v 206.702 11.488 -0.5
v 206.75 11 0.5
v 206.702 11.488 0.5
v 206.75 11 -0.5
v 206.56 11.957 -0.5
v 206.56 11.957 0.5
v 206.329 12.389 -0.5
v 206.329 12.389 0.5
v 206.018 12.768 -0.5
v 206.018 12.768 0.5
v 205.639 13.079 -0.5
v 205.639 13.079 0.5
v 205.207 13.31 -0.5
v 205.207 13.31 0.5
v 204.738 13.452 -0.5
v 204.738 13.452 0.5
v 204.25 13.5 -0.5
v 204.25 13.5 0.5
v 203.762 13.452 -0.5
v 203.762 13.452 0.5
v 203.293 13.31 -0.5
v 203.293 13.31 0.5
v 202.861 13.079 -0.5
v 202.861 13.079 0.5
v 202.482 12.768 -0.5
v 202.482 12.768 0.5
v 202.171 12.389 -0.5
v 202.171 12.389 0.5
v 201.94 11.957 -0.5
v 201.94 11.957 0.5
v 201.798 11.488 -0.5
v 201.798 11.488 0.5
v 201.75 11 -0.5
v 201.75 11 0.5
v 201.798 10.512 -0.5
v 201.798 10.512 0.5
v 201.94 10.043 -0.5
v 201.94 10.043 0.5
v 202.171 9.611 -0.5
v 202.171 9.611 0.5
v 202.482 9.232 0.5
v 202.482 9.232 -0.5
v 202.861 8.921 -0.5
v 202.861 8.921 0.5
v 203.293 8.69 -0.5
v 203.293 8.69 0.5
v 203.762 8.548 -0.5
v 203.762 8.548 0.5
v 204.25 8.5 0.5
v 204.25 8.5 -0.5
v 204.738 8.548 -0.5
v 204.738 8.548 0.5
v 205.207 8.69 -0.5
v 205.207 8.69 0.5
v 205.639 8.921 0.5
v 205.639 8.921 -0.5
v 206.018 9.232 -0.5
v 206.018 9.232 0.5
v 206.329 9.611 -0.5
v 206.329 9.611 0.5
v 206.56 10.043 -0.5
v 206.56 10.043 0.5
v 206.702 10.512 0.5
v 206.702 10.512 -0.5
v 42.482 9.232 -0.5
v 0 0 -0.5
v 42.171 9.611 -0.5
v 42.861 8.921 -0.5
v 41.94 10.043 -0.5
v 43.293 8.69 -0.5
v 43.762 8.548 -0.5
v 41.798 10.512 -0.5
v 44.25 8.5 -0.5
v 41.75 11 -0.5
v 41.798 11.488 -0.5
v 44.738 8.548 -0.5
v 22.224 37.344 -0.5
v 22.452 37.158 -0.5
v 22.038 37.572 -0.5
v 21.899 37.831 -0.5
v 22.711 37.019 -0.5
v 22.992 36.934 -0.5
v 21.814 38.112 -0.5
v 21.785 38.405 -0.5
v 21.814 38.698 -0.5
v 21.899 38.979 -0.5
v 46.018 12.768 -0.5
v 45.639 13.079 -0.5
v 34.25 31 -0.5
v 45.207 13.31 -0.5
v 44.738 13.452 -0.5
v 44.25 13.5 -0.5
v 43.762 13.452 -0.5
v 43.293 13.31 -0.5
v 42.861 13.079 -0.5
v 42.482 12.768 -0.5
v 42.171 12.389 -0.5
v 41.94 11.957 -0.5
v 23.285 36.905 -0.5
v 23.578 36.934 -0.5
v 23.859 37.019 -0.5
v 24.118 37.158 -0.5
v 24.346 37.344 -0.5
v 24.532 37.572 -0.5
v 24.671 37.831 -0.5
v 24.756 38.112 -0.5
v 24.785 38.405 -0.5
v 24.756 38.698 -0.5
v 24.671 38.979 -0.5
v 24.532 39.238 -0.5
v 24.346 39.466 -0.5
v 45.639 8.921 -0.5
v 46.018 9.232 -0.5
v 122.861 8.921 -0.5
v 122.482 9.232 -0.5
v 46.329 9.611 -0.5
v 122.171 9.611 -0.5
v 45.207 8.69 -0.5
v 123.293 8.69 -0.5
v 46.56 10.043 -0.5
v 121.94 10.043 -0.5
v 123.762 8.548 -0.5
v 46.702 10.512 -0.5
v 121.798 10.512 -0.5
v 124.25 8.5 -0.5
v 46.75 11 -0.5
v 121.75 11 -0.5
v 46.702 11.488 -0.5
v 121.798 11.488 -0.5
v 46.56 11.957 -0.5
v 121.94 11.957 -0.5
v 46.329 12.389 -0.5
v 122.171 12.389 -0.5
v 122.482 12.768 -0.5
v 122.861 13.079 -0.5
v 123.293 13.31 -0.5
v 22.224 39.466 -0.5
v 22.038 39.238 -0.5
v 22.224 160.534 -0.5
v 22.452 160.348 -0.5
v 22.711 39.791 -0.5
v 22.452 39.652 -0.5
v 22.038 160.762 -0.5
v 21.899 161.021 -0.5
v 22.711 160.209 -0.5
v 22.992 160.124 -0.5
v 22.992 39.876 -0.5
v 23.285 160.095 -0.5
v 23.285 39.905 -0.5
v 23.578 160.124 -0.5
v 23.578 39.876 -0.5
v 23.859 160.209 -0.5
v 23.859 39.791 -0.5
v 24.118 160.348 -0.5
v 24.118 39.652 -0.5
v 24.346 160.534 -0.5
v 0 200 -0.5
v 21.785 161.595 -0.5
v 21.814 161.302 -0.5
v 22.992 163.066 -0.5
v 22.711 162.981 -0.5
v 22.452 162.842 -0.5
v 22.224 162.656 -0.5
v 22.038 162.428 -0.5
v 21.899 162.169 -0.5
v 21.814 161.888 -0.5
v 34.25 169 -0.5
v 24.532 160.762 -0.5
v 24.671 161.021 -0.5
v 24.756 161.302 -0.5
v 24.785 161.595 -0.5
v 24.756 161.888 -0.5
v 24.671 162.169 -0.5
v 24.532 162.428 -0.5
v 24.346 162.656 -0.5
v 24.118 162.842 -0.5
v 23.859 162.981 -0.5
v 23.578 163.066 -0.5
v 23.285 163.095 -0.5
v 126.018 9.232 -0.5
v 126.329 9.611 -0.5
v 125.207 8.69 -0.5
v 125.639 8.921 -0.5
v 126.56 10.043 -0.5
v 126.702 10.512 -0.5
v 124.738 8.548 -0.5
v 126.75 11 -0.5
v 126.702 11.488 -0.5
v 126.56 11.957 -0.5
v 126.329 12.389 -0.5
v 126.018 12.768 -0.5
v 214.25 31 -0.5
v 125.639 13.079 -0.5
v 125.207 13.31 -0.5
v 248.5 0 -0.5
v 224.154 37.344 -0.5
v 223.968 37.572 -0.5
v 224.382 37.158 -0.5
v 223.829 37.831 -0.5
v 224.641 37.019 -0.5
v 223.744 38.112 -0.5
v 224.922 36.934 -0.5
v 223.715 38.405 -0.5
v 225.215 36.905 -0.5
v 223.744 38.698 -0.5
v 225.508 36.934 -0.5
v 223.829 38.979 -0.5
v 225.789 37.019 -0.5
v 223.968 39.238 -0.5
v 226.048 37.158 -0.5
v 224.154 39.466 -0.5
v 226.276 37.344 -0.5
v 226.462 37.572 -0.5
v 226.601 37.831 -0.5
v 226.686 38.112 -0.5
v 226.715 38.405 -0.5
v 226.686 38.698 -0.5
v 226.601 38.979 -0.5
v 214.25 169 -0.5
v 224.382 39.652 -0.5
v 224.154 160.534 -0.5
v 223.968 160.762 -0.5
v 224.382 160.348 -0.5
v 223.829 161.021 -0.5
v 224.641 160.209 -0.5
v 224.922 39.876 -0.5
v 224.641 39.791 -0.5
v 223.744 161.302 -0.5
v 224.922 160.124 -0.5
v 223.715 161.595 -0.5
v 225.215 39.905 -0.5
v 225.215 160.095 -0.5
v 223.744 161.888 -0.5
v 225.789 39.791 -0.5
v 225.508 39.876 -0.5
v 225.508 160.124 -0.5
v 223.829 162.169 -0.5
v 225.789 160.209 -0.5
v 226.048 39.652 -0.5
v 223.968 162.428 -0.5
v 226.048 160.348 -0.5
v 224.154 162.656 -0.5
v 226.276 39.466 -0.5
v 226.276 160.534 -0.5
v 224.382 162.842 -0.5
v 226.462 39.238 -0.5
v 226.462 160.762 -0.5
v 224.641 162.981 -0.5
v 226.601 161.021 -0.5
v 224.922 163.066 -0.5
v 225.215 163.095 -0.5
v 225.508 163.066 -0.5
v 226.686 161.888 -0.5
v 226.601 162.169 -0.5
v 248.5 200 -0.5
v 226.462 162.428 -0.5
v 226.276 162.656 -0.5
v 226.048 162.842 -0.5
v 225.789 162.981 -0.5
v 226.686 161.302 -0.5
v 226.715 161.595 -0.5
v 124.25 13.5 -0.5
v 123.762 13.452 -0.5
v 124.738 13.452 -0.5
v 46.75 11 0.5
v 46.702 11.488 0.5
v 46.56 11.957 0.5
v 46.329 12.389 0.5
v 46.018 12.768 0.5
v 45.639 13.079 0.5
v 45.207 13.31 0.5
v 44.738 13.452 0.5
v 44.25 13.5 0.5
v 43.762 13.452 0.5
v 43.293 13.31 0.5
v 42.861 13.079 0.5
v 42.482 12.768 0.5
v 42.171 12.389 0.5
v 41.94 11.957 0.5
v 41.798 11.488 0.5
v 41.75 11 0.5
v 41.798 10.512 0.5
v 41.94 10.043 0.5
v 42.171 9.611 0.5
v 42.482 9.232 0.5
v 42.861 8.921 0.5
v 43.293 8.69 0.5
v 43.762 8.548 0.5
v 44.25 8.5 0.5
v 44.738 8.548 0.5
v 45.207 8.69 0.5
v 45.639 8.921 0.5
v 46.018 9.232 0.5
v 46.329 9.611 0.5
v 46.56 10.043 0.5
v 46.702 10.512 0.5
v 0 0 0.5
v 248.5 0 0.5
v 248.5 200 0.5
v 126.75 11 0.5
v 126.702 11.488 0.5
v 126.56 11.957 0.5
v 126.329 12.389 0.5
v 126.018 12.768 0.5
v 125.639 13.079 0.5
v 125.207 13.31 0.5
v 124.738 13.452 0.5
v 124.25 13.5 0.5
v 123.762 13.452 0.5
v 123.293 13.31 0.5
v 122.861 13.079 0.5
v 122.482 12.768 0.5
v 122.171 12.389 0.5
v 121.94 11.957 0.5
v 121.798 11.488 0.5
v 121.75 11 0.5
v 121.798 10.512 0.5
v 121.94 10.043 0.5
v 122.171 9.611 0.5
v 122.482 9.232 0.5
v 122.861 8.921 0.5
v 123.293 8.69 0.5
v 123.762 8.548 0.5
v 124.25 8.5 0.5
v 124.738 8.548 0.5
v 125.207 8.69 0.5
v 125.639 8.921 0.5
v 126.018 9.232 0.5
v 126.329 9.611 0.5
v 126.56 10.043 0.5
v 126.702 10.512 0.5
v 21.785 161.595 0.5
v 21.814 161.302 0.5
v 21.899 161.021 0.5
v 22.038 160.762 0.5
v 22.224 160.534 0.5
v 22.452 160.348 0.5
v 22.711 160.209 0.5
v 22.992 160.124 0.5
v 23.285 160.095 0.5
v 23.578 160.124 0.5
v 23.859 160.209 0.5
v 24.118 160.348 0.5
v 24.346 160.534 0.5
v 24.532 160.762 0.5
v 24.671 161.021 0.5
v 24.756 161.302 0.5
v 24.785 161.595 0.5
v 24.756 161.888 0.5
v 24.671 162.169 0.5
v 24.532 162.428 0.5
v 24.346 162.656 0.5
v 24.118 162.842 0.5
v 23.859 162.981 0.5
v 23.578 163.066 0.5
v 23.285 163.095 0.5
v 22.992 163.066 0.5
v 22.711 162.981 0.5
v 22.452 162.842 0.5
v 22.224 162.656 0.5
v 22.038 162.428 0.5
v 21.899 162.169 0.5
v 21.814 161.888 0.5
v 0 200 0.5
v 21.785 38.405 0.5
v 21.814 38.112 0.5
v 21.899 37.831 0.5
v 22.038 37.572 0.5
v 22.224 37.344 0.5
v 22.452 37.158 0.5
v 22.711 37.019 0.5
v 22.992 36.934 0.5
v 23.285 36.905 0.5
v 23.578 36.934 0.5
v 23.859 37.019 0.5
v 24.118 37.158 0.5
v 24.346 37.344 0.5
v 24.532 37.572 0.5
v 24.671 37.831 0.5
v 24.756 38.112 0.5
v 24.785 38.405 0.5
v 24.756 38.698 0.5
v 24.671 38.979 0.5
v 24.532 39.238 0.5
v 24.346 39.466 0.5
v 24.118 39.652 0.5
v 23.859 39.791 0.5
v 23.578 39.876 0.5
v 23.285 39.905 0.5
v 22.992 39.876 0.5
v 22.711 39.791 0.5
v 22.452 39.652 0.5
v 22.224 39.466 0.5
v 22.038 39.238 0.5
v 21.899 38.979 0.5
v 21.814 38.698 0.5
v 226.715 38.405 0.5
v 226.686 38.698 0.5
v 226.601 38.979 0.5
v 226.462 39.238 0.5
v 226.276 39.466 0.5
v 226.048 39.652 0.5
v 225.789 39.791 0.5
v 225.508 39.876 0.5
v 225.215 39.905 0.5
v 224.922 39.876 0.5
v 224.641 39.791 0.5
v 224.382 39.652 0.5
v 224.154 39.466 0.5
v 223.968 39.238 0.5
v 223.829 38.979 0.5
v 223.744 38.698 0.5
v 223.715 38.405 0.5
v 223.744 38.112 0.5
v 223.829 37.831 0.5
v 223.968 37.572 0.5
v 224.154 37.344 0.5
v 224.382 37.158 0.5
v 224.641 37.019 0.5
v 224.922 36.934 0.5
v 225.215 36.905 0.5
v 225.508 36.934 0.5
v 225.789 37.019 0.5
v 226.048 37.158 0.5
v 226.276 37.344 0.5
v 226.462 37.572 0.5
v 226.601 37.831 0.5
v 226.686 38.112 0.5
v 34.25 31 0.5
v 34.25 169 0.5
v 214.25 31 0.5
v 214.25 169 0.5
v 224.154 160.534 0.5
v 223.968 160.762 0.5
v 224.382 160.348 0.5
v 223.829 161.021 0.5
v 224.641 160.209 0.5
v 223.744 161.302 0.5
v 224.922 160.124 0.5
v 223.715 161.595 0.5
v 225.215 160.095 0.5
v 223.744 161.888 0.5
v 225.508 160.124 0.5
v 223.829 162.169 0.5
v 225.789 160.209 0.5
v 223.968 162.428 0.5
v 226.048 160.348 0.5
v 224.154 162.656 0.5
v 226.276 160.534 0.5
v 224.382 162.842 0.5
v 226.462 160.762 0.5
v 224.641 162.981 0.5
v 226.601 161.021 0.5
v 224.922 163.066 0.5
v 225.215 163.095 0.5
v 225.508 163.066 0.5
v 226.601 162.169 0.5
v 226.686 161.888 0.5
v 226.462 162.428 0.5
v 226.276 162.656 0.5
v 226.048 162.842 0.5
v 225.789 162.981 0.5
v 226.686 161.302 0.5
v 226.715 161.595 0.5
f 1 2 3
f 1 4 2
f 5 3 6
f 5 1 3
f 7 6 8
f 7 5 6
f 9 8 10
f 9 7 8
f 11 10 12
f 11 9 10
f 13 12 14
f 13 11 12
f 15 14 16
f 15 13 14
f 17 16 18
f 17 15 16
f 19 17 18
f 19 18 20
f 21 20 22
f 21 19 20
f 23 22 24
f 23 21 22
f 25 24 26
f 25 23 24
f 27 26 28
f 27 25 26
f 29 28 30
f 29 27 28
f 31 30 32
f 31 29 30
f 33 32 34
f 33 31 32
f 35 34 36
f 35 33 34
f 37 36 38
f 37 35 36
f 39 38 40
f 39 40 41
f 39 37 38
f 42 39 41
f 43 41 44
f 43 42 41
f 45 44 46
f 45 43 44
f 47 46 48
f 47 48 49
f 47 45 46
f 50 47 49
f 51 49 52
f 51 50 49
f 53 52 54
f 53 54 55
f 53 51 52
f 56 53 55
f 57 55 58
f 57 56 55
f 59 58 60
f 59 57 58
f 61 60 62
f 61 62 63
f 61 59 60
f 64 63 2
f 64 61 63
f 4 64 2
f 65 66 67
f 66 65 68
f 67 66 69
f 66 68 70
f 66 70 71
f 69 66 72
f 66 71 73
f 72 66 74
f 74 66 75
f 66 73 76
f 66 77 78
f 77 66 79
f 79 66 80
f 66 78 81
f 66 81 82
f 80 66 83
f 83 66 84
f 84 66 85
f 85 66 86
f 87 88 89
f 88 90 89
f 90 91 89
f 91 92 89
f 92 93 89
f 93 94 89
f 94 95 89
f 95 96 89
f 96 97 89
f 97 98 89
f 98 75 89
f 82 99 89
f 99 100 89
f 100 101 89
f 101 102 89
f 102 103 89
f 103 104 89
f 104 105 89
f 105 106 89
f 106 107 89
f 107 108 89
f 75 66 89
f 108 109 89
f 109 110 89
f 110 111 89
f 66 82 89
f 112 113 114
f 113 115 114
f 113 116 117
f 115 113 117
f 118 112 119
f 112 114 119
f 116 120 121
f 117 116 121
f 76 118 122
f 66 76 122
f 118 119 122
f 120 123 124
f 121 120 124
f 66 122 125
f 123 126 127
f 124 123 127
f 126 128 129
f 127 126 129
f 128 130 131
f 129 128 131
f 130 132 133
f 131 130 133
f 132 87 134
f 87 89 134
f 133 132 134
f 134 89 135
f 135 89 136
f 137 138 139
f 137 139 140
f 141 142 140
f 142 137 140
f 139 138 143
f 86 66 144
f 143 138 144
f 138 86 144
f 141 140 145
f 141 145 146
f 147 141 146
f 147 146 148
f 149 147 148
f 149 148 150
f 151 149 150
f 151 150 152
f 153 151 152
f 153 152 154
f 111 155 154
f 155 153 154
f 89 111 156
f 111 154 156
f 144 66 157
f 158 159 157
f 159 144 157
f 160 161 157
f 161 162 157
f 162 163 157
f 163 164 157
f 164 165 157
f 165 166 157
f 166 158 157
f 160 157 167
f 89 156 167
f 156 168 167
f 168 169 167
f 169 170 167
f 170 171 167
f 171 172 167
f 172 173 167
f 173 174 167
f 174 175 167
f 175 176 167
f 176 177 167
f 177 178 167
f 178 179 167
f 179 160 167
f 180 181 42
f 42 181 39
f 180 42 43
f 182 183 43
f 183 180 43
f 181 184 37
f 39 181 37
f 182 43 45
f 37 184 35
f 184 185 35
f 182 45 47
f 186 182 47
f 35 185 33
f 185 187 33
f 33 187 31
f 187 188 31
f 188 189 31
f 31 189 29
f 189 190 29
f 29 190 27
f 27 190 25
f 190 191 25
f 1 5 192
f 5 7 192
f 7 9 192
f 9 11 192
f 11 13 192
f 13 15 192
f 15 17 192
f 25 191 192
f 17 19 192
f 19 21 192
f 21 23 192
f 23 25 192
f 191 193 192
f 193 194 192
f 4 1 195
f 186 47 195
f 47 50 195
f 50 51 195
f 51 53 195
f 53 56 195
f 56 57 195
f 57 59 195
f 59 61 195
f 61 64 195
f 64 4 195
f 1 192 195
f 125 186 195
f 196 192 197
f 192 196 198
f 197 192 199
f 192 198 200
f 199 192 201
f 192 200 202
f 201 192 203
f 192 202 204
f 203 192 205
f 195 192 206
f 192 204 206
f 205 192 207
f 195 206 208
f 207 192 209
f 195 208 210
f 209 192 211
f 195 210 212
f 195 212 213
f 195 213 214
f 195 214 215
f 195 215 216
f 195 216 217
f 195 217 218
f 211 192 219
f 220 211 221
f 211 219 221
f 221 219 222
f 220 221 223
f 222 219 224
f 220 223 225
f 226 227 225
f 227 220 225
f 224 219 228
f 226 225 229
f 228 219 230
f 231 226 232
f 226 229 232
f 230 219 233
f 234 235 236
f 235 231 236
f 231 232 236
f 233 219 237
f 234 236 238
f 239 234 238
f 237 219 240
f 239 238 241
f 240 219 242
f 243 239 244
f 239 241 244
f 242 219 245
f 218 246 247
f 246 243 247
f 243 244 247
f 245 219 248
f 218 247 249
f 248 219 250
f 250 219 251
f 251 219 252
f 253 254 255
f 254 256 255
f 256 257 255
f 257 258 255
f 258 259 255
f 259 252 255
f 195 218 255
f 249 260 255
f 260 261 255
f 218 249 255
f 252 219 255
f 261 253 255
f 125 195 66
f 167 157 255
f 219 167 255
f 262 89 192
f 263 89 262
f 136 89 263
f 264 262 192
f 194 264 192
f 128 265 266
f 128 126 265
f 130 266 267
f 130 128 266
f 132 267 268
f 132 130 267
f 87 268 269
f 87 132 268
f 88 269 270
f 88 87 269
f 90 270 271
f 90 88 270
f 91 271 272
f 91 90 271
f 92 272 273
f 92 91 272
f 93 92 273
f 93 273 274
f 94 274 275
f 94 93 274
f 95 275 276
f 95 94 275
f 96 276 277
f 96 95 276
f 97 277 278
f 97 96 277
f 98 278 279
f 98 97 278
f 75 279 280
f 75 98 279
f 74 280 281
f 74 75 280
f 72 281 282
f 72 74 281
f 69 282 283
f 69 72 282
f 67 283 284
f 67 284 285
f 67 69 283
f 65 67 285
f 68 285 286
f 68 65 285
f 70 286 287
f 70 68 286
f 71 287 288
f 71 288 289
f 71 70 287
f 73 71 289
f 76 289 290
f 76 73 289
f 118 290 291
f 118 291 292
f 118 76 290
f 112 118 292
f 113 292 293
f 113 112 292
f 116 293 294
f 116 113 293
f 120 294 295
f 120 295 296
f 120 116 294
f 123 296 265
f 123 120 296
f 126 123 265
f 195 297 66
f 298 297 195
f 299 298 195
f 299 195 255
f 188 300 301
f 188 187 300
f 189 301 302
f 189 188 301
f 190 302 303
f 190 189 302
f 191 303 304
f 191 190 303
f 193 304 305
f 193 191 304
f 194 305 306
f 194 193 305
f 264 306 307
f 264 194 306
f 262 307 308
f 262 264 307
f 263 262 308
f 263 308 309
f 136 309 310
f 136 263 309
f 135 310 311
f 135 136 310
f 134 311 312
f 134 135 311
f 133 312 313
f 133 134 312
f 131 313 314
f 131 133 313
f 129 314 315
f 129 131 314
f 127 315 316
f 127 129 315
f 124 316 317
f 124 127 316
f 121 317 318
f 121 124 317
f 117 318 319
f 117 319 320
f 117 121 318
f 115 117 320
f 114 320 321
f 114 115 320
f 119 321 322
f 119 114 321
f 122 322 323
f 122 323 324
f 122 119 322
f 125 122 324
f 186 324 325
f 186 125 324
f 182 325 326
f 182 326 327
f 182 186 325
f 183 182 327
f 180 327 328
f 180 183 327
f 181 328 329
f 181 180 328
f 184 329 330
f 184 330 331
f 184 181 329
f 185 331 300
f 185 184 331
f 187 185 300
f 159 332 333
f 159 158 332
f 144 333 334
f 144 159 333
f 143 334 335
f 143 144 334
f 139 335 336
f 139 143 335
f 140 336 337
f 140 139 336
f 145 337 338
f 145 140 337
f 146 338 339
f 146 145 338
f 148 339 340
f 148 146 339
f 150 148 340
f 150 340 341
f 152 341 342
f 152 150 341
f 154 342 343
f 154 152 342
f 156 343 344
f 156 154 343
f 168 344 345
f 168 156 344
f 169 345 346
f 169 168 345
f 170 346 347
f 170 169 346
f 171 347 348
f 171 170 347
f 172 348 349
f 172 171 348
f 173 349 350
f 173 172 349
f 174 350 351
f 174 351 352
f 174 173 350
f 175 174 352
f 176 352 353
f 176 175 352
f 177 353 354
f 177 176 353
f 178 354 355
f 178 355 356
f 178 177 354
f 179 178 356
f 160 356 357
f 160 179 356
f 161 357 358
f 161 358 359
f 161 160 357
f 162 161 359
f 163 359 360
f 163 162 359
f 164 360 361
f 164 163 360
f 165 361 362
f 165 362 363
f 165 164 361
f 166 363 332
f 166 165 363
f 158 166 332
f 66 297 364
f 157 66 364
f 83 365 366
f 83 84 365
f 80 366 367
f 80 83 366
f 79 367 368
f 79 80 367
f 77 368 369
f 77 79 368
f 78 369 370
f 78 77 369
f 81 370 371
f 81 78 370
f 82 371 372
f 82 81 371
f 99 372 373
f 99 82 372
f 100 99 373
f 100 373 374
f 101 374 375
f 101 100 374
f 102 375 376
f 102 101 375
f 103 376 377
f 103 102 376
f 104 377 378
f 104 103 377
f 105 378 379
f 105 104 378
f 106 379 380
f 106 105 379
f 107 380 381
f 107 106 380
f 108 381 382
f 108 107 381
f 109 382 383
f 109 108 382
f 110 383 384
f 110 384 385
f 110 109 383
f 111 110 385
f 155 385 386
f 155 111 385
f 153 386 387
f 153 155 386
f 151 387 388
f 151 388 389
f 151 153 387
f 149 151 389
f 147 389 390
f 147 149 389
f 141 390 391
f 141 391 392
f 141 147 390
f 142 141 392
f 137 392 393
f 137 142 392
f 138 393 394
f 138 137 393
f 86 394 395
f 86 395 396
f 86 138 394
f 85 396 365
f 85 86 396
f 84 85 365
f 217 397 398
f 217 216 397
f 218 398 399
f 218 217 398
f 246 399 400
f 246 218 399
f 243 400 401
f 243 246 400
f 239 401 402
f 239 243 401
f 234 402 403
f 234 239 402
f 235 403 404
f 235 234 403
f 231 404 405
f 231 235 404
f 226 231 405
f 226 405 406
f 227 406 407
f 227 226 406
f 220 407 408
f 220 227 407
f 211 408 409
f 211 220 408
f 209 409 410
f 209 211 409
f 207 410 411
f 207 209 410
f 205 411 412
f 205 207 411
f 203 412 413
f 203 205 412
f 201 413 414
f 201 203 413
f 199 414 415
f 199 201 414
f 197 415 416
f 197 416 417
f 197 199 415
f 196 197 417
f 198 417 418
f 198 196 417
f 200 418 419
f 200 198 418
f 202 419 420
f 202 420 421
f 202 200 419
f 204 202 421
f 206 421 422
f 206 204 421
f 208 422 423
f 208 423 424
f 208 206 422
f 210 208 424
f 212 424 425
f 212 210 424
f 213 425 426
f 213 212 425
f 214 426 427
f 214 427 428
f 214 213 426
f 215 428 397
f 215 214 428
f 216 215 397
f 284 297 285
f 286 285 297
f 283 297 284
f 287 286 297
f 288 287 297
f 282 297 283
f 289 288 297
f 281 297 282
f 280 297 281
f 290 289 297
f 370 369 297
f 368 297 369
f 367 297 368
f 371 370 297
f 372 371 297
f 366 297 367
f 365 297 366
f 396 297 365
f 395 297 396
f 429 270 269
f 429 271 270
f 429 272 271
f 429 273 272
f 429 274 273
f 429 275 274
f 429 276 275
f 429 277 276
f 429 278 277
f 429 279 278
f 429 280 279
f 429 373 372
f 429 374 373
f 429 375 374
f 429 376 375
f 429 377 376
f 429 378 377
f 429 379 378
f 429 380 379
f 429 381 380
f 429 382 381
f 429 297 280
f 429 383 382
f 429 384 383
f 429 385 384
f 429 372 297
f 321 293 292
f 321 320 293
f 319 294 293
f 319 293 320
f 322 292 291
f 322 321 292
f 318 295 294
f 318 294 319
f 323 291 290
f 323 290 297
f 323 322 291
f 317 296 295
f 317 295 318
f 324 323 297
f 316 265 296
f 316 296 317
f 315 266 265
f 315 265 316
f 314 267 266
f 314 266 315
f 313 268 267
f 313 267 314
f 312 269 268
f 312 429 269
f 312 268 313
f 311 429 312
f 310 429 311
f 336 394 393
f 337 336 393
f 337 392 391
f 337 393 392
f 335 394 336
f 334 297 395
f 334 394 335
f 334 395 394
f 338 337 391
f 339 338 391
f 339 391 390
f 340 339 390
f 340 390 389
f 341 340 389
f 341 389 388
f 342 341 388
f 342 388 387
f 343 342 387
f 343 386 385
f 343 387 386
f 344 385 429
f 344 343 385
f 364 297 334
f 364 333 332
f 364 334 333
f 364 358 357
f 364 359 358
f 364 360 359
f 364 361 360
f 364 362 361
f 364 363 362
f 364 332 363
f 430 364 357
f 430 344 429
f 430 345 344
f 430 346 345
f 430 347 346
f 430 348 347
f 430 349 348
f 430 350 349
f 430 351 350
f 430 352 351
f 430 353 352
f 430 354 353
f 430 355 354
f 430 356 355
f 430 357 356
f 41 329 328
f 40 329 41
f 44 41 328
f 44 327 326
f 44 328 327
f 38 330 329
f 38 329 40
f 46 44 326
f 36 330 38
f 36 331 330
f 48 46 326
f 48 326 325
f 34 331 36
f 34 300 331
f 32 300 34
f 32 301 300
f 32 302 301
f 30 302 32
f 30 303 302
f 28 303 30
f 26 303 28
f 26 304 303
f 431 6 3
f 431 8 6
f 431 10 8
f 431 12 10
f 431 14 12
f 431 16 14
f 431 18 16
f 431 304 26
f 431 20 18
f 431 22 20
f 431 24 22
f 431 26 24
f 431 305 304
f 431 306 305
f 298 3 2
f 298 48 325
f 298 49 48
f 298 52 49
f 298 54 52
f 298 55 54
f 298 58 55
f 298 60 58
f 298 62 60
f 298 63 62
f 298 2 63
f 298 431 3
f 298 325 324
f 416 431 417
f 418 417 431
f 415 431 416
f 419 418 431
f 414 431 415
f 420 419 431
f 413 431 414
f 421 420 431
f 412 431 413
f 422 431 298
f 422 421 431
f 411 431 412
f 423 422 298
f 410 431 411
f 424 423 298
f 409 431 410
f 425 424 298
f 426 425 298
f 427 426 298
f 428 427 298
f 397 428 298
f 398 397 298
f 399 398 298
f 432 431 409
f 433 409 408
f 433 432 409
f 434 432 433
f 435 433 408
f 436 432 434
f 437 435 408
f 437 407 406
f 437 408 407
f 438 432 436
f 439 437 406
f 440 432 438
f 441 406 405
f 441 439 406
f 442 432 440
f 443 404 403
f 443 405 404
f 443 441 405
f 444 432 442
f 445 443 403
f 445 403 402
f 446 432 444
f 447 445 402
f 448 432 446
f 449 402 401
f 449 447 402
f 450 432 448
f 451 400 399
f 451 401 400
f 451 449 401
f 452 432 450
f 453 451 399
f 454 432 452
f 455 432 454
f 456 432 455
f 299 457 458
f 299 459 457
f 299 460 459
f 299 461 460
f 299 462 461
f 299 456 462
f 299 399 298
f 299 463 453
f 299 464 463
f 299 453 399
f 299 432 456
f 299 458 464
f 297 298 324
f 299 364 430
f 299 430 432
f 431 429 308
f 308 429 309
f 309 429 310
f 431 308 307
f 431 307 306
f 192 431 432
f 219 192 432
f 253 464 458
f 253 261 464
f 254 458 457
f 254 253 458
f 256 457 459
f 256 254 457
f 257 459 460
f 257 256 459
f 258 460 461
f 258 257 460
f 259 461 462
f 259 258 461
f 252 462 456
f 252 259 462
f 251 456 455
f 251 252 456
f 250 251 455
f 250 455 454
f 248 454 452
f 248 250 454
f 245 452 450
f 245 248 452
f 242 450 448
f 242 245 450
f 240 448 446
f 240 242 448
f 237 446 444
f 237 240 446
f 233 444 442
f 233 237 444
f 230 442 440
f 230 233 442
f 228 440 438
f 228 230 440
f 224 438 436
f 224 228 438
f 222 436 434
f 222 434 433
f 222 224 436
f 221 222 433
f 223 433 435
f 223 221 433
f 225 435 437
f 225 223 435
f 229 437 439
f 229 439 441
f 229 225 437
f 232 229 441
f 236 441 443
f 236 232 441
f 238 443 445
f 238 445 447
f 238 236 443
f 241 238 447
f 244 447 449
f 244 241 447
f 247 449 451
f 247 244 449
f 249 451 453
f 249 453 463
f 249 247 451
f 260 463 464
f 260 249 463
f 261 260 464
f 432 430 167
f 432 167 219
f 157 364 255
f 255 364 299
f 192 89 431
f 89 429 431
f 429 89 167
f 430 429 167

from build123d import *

# Parameters (mm, degrees)
SKETCH_1_W      = 248.5
SKETCH_1_H      = 200
SKETCH_1_R      = 2.5
SKETCH_1_R_2    = 1.5
SKETCH_1_W_2    = 180
SKETCH_1_H_2    = 138
EXTRUDE_1_DEPTH = 0.5


with BuildPart() as part:
    # 스케치1 → 보스-돌출1 (new, symmetric)
    with BuildSketch(Plane.XY):
        with Locations((124.25, 100)):
            Rectangle(SKETCH_1_W, SKETCH_1_H)
        with Locations((124.25, 11)):
            Circle(SKETCH_1_R, mode=Mode.SUBTRACT)
        with Locations((204.25, 11)):
            Circle(SKETCH_1_R, mode=Mode.SUBTRACT)
        with Locations((44.25, 11)):
            Circle(SKETCH_1_R, mode=Mode.SUBTRACT)
        with Locations((225.215, 161.595)):
            Circle(SKETCH_1_R_2, mode=Mode.SUBTRACT)
        with Locations((225.215, 38.405)):
            Circle(SKETCH_1_R_2, mode=Mode.SUBTRACT)
        with Locations(Location((23.285, 38.405, 0), (0, 0, 180))):
            Circle(SKETCH_1_R_2, mode=Mode.SUBTRACT)
        with Locations(Location((23.285, 161.595, 0), (0, 0, 180))):
            Circle(SKETCH_1_R_2, mode=Mode.SUBTRACT)
        with Locations((124.25, 100)):
            Rectangle(SKETCH_1_W_2, SKETCH_1_H_2, mode=Mode.SUBTRACT)
    extrude(amount=EXTRUDE_1_DEPTH, both=True)


solid = part.part
